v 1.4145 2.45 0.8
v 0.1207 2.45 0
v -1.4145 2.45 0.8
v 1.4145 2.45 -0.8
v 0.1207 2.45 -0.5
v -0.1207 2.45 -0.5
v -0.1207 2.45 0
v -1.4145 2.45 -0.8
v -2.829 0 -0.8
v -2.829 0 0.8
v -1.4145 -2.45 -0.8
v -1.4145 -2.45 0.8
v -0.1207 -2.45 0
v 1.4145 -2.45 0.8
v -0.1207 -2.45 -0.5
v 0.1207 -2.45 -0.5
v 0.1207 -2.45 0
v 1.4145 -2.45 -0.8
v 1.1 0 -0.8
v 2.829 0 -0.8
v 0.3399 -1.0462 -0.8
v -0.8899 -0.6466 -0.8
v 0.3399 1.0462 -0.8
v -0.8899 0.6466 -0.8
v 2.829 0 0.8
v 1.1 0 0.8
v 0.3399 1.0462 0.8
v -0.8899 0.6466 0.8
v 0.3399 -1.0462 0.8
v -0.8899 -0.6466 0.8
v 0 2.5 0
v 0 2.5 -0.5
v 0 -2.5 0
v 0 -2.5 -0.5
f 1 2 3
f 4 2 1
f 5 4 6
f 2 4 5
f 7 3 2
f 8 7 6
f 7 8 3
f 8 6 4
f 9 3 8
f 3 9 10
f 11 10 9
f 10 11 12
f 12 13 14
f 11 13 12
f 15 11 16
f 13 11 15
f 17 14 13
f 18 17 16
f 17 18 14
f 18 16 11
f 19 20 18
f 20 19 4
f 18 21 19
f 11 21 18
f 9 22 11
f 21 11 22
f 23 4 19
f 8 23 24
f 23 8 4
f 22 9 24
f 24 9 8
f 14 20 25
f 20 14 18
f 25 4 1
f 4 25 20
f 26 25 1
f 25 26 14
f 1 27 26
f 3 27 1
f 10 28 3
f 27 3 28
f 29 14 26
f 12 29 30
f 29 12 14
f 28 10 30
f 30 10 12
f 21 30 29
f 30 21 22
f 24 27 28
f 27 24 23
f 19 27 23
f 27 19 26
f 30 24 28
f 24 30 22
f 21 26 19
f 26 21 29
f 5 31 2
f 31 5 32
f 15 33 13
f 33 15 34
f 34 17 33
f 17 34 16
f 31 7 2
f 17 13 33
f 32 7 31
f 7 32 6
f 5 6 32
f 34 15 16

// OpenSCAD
// Parameters
thread_nominal_diameter_mm = 2; //[1:4:0.1]
thread_pitch_mm = 0.4; //[0.2:0.8:0.05]
across_flats_mm = 4.9; //[2.45:9.8:0.05]
thickness_mm = 1.6; //[0.8:3.2:0.05]
hole_type = 0; //[0:1:1]
clearance_diameter_mm = 2.2; //[2:3:0.05]
thread_minor_diameter_factor = 0.85; //[0.7:0.95:0.01]
washer_enabled = 1; //[0:1:1]
washer_outer_diameter_mm = 5; //[3:10:0.1]
washer_thickness_mm = 0.5; //[0.25:1.5:0.05]
overlap_mm = 0.8; //[0.2:2:0.1]
eps_mm = 0.05; //[0.01:0.2:0.01]

// Hexagonal Nut
module hex_nut() {
  color("DimGray") {
    difference() {
      linear_extrude(height = thickness_mm, center = true) {
        polygon(points = [
          [across_flats_mm/sqrt(3), 0],
          [across_flats_mm/(2*sqrt(3)), across_flats_mm/2],
          [-across_flats_mm/(2*sqrt(3)), across_flats_mm/2],
          [-across_flats_mm/sqrt(3), 0],
          [-across_flats_mm/(2*sqrt(3)), -across_flats_mm/2],
          [across_flats_mm/(2*sqrt(3)), -across_flats_mm/2]
        ]);
      }
      cylinder(r = ((1-hole_type)*(clearance_diameter_mm/2) + hole_type*(thread_nominal_diameter_mm*thread_minor_diameter_factor/2)), 
               h = thickness_mm + 2*eps_mm, center = true);
    }
  }
}

// Washer
module washer() {
  if (washer_enabled) {
    color("Silver") {
      difference() {
        cylinder(r = washer_outer_diameter_mm/2, h = washer_thickness_mm, center = true);
        cylinder(r = clearance_diameter_mm/2, h = washer_thickness_mm + 2*eps_mm, center = true);
      }
    }
  }
}

// Nut and Washer Assembly
module nut_and_washer() {
  union() {
    hex_nut();
    translate([0, 0, -(thickness_mm/2 + washer_thickness_mm/2 - overlap_mm)*washer_enabled]) washer();
  }
}

// Final Assembly
module assembly() {
  nut_and_washer();
}

assembly();
